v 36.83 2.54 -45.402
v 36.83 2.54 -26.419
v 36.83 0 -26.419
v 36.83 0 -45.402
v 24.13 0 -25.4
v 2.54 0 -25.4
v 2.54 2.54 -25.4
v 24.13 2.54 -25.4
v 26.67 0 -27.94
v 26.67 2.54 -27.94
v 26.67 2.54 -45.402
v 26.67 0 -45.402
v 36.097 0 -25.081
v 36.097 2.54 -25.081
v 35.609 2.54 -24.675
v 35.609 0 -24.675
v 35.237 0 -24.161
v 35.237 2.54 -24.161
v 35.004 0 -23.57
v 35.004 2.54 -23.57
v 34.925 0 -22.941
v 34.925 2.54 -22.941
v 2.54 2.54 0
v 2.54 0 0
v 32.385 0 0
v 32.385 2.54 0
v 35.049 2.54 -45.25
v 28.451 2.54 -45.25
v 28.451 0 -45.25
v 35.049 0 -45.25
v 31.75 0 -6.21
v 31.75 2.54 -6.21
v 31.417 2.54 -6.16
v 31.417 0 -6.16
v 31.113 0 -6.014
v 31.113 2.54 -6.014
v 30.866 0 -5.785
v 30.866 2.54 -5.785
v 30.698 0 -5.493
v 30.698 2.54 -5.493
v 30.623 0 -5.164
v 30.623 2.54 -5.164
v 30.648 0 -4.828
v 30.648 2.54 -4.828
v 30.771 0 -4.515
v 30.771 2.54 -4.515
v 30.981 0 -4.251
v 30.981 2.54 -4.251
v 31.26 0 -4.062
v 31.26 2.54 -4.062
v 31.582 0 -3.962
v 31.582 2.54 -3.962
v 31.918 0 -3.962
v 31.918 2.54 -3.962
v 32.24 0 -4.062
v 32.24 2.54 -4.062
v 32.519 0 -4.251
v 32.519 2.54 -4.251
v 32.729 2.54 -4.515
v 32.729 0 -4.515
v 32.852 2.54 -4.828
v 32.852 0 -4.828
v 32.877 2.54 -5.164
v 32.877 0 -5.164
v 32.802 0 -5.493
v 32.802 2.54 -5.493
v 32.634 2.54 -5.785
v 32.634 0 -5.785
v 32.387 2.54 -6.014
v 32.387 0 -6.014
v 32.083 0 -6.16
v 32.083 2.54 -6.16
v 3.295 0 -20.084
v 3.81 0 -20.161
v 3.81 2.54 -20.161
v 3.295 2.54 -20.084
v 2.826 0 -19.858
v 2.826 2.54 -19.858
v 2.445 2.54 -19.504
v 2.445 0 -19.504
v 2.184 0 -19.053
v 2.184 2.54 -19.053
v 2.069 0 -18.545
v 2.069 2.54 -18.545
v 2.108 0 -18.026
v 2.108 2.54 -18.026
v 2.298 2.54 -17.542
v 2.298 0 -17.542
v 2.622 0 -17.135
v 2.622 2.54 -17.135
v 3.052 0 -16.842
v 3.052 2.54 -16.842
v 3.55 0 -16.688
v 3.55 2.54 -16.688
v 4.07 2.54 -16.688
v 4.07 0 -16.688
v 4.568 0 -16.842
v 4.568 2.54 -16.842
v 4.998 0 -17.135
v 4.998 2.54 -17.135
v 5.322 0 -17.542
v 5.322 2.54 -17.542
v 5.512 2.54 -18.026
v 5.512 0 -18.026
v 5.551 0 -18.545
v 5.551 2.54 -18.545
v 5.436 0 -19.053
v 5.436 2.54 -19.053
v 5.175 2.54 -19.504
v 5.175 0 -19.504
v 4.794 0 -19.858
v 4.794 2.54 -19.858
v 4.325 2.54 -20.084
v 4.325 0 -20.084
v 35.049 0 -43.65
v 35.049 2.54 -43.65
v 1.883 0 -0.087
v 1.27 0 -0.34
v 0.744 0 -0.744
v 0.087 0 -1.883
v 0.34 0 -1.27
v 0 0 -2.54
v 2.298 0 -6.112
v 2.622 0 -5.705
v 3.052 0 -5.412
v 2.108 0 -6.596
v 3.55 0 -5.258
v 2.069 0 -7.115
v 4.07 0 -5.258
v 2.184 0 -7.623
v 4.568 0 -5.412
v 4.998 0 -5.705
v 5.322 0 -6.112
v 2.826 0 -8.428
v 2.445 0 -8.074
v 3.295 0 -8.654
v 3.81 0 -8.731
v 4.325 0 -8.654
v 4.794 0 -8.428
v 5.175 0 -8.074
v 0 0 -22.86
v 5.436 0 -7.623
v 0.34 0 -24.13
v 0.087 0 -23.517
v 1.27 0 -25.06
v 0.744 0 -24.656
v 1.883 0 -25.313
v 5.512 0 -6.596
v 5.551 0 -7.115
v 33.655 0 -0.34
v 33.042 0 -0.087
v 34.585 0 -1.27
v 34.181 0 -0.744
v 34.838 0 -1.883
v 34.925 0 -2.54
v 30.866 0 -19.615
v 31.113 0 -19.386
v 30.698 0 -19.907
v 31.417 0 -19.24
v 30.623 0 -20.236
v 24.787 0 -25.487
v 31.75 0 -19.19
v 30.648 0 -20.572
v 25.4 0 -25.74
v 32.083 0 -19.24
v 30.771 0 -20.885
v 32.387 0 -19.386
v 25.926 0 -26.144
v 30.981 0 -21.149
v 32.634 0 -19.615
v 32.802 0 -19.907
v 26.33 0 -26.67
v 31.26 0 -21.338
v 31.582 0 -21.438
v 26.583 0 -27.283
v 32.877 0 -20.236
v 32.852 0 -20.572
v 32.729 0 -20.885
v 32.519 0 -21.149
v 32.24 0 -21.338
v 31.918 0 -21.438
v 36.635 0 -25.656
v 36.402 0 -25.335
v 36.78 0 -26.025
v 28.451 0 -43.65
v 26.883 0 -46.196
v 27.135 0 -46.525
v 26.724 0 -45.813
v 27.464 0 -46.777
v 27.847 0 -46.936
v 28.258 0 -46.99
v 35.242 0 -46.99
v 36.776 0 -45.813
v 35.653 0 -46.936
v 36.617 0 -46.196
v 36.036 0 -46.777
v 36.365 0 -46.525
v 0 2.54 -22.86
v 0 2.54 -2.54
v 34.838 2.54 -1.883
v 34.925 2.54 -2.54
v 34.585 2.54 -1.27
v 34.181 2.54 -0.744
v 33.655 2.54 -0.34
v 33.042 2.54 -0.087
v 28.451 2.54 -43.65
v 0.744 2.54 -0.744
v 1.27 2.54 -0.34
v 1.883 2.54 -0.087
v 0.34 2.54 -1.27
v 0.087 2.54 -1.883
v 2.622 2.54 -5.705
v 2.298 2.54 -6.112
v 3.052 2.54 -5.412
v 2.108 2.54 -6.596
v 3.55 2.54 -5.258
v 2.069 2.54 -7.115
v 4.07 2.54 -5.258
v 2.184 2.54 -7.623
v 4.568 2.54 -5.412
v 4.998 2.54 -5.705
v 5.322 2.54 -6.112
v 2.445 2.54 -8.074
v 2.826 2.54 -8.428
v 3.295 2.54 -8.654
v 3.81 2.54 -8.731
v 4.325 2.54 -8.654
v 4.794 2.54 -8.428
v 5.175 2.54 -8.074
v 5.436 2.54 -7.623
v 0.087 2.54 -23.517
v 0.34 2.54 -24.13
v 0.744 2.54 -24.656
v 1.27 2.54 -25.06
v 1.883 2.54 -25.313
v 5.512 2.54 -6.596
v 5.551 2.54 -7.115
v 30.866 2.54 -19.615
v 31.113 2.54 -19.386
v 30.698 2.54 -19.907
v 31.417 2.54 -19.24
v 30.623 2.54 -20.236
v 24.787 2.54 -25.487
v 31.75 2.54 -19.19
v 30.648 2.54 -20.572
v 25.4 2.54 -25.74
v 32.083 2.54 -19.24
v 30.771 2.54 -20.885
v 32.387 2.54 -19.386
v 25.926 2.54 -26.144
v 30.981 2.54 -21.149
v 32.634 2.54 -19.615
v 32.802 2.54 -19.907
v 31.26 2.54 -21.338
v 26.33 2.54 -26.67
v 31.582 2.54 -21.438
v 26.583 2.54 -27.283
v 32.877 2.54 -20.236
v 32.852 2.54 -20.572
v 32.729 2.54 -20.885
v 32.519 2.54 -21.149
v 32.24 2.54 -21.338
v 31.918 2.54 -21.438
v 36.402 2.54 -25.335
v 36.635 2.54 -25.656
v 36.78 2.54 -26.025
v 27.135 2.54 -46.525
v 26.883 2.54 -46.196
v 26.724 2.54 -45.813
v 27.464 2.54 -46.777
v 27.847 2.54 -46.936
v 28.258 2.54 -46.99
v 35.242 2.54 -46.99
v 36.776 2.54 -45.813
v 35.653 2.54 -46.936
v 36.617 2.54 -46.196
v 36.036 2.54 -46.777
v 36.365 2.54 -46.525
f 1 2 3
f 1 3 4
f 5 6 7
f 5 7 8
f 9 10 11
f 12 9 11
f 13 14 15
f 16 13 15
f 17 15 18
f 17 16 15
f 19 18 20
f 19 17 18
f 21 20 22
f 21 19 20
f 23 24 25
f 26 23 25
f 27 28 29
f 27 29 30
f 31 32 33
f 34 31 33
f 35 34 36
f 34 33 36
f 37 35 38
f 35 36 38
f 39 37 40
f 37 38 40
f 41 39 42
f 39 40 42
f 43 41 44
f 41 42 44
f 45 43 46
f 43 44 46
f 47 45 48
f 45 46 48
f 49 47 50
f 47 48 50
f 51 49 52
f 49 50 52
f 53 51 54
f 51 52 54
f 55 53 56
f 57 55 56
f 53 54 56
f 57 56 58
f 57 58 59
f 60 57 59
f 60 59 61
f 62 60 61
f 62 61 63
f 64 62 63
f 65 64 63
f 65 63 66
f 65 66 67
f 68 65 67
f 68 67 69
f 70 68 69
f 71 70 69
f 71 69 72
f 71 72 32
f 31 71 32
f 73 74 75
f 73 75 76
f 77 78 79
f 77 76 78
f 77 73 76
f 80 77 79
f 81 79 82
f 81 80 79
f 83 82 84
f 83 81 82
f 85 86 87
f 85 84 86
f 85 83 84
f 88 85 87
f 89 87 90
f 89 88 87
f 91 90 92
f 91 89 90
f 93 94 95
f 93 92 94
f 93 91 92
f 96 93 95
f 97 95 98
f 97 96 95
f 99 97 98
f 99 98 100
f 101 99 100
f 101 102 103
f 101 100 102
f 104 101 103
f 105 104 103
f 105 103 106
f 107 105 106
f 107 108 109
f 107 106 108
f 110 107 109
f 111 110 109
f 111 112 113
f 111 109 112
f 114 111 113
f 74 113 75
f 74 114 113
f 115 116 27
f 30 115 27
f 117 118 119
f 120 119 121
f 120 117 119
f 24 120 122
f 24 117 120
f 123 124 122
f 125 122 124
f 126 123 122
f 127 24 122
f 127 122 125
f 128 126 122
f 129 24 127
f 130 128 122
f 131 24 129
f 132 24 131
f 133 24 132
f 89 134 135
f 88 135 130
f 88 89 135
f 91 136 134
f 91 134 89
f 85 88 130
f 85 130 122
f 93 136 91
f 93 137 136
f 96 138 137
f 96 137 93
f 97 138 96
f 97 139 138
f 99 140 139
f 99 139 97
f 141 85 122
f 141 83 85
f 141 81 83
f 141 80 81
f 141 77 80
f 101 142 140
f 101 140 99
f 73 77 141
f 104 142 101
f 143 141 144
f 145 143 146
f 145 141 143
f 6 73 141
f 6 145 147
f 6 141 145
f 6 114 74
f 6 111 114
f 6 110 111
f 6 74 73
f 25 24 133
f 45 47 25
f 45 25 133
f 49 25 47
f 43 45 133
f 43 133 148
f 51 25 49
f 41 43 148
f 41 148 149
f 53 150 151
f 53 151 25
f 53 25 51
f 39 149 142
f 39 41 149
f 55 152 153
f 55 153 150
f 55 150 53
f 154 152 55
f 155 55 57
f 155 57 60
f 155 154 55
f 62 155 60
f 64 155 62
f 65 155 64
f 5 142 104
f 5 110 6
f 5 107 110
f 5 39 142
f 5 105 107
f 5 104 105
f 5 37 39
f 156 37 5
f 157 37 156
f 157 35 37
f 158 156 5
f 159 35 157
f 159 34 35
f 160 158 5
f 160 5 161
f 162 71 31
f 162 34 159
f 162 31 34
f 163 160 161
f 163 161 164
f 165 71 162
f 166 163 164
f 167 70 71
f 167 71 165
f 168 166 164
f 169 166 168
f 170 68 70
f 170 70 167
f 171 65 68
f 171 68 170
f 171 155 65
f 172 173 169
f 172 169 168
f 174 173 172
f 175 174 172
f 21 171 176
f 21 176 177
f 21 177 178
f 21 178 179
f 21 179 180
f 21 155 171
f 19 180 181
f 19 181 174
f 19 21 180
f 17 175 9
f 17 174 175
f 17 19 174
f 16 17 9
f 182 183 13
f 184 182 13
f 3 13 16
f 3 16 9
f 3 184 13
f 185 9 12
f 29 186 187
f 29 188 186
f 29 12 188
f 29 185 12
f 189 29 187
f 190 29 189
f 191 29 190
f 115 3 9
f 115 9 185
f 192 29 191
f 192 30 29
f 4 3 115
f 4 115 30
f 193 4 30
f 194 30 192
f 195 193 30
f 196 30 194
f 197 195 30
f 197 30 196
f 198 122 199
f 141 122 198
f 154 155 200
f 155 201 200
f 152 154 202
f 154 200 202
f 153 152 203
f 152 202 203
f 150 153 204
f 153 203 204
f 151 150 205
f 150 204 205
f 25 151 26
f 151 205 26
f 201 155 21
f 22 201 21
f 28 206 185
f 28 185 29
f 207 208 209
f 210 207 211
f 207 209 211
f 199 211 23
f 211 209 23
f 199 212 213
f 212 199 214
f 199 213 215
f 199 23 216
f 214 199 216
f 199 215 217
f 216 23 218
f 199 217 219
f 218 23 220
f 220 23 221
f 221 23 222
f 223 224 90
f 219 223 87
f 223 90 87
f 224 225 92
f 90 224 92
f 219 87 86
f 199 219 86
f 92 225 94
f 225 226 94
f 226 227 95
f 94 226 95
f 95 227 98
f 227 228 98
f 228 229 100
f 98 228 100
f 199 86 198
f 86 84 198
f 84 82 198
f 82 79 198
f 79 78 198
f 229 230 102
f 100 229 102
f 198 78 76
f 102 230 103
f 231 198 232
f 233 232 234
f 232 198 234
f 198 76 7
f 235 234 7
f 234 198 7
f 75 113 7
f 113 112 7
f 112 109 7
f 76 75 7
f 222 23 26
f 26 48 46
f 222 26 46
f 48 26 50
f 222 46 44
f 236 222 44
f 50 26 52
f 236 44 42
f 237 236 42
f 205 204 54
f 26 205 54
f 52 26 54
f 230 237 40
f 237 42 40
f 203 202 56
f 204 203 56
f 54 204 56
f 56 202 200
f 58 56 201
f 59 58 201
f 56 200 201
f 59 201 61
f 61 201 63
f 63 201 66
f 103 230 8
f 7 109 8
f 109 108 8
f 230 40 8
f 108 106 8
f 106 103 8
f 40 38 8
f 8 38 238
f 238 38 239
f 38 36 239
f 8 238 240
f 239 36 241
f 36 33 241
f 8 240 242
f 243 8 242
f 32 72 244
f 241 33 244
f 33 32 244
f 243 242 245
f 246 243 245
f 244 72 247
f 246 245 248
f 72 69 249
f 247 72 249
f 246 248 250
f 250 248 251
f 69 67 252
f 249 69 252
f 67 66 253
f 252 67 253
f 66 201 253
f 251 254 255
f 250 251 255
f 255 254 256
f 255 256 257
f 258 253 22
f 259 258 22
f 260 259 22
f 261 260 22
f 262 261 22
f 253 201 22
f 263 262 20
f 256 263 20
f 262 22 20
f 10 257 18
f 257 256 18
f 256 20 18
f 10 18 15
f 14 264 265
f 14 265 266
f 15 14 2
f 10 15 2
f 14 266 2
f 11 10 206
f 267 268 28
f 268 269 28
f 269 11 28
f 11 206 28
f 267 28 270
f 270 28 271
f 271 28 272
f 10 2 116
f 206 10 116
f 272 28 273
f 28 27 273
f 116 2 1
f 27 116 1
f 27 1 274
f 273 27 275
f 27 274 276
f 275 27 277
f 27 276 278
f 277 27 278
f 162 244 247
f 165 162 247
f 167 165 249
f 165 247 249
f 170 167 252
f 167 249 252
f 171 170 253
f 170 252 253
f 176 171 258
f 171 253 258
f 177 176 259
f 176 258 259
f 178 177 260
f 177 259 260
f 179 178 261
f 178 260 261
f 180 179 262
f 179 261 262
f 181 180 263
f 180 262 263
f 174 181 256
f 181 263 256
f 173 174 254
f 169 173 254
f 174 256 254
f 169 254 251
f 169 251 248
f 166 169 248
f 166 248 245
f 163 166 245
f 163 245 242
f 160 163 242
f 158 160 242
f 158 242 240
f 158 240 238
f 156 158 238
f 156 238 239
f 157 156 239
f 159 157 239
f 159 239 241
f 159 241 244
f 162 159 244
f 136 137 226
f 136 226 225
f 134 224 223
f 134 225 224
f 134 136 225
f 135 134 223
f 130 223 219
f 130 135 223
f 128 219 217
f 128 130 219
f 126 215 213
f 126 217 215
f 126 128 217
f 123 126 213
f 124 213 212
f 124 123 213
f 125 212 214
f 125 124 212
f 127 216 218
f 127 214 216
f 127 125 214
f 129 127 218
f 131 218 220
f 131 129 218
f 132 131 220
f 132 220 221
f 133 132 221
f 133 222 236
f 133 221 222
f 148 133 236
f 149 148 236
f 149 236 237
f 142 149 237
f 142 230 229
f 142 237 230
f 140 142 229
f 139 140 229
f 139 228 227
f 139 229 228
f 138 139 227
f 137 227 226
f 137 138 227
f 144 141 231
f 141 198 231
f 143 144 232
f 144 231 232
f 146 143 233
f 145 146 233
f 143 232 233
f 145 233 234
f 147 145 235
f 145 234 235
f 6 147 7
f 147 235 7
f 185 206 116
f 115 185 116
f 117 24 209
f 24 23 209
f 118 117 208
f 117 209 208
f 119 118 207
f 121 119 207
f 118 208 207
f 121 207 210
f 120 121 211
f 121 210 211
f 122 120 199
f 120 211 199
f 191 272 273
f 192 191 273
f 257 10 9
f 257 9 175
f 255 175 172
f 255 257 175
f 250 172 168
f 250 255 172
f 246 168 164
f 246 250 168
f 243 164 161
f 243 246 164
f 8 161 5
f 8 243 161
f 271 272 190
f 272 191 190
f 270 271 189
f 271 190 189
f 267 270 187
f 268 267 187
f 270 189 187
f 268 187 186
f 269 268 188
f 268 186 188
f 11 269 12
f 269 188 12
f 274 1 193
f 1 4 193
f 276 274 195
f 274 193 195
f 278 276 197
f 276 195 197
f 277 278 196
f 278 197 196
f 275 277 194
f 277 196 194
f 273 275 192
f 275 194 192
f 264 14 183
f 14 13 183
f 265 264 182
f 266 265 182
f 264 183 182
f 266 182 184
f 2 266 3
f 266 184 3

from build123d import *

# Parameters (mm, degrees)
SKETCH1_W               = 34.925
SKETCH1_H               = 25.4
BOSS_EXTRUDE1_DEPTH     = 2.54
CUT_EXTRUDE3_DEPTH      = 44.259302179
CUT_EXTRUDE3_DEPTH_BACK = 44.259302179
SKETCH2_R               = 1.74625
SKETCH5_R               = 1.1303
CUT_EXTRUDE4_DEPTH      = 44.259302179
SKETCH6_W               = 10.16
SKETCH6_H               = 21.59
BOSS_EXTRUDE2_DEPTH     = 2.54
FILLET1_R               = 2.54
FILLET2_R               = 1.5875
FILLET3_R               = 2.54
SKETCH8_W               = 6.597299276
SKETCH8_H               = 1.6002
CUT_EXTRUDE6_DEPTH      = 2.54


with BuildPart() as part:
    # Sketch1 → Boss-Extrude1 (new body)
    with BuildSketch(Plane(origin=(0, 0, 0), x_dir=(1, 0, 0), z_dir=(0, 1, 0))):
        with Locations((17.4625, 12.7)):
            Rectangle(SKETCH1_W, SKETCH1_H)
    extrude(amount=BOSS_EXTRUDE1_DEPTH)

    # Sketch2 → Cut-Extrude3 (cut, two sides: drawn at the far end of the back side and taken through both)
    with BuildSketch(Plane(origin=(0, 2.54, 0), x_dir=(1, 0, 0), z_dir=(0, 1, 0)).offset(-CUT_EXTRUDE3_DEPTH_BACK)):
        with Locations(Location((3.81, 18.415, 0), (0, 0, 90))):
            Circle(SKETCH2_R)
        with Locations(Location((3.81, 6.985, 0), (0, 0, 90))):
            Circle(SKETCH2_R)
    extrude(amount=CUT_EXTRUDE3_DEPTH + CUT_EXTRUDE3_DEPTH_BACK, mode=Mode.SUBTRACT)

    # Sketch5 → Cut-Extrude4 (cut, through all)
    with BuildSketch(Plane(origin=(0, 2.54, 0), x_dir=(1, 0, 0), z_dir=(0, 1, 0))):
        with Locations(Location((31.75, 20.32, 0), (0, 0, 270))):
            Circle(SKETCH5_R)
        with Locations(Location((31.75, 5.08, 0), (0, 0, 90))):
            Circle(SKETCH5_R)
    extrude(amount=-CUT_EXTRUDE4_DEPTH, mode=Mode.SUBTRACT)

    # Sketch6 → Boss-Extrude2 (add)
    with BuildSketch(Plane(origin=(0, 2.54, 0), x_dir=(1, 0, 0), z_dir=(0, 1, 0))):
        with Locations((31.75, 36.195)):
            Rectangle(SKETCH6_W, SKETCH6_H)
    extrude(amount=-BOSS_EXTRUDE2_DEPTH)

    # Fillet1
    # the kernel refuses this fillet: 2.54 mm, written as the material it adds along each edge
    with BuildSketch(Plane(origin=(26.67, 2.54, -25.4), x_dir=(-1, 0, 0), z_dir=(0, -1, 0))) as fillet1_piece_1:
        with BuildLine():
            CenterArc((FILLET1_R, FILLET1_R), FILLET1_R, 180, 90)
            Line((0, FILLET1_R), (-FILLET1_R * 0.02, FILLET1_R))
            Line((-FILLET1_R * 0.02, FILLET1_R), (-FILLET1_R * 0.02, -FILLET1_R * 0.02))
            Line((-FILLET1_R * 0.02, -FILLET1_R * 0.02), (FILLET1_R, -FILLET1_R * 0.02))
            Line((FILLET1_R, -FILLET1_R * 0.02), (FILLET1_R, 0))
        make_face()
    extrude(amount=2.54)
    with BuildSketch(Plane(origin=(34.925, 0, -25.4), x_dir=(0, 0, 1), z_dir=(0, 1, 0))) as fillet1_piece_2:
        with BuildLine():
            CenterArc((2.459344425, 2.54), FILLET1_R, 194.477512186, 75.522487814)
            Line((0, 1.905), (-0.049186888, 1.8923))
            ThreePointArc((-0.049186888, 1.8923), (-0.0508, 0.9525), (-0.0508, 0))
            Line((-0.0508, 0), (0, -0.0508))
            Line((0, -0.0508), (2.459344425, -0.0508))
            Line((2.459344425, -0.0508), (2.459344425, 0))
        make_face()
    extrude(amount=2.54)

    # Fillet2
    fillet2_edges = [part.edges().sort_by_distance(p)[0] for p in [
        (26.67, 1.27, -46.99),
        (36.83, 1.27, -46.99),
        (36.83, 1.27, -25.4),
    ]]
    fillet(fillet2_edges, radius=FILLET2_R)

    # Fillet3
    fillet3_edges = [part.edges().sort_by_distance(p)[0] for p in [
        (0, 1.27, -25.4),
        (34.925, 1.27, 0),
        (0, 1.27, 0),
    ]]
    fillet(fillet3_edges, radius=FILLET3_R)

    # Sketch8 → Cut-Extrude6 (cut)
    with BuildSketch(Plane(origin=(0, 2.54, 0), x_dir=(1, 0, 0), z_dir=(0, 1, 0))):
        with Locations((31.75, 44.45)):
            Rectangle(SKETCH8_W, SKETCH8_H)
    extrude(amount=-CUT_EXTRUDE6_DEPTH, mode=Mode.SUBTRACT)


solid = part.part
